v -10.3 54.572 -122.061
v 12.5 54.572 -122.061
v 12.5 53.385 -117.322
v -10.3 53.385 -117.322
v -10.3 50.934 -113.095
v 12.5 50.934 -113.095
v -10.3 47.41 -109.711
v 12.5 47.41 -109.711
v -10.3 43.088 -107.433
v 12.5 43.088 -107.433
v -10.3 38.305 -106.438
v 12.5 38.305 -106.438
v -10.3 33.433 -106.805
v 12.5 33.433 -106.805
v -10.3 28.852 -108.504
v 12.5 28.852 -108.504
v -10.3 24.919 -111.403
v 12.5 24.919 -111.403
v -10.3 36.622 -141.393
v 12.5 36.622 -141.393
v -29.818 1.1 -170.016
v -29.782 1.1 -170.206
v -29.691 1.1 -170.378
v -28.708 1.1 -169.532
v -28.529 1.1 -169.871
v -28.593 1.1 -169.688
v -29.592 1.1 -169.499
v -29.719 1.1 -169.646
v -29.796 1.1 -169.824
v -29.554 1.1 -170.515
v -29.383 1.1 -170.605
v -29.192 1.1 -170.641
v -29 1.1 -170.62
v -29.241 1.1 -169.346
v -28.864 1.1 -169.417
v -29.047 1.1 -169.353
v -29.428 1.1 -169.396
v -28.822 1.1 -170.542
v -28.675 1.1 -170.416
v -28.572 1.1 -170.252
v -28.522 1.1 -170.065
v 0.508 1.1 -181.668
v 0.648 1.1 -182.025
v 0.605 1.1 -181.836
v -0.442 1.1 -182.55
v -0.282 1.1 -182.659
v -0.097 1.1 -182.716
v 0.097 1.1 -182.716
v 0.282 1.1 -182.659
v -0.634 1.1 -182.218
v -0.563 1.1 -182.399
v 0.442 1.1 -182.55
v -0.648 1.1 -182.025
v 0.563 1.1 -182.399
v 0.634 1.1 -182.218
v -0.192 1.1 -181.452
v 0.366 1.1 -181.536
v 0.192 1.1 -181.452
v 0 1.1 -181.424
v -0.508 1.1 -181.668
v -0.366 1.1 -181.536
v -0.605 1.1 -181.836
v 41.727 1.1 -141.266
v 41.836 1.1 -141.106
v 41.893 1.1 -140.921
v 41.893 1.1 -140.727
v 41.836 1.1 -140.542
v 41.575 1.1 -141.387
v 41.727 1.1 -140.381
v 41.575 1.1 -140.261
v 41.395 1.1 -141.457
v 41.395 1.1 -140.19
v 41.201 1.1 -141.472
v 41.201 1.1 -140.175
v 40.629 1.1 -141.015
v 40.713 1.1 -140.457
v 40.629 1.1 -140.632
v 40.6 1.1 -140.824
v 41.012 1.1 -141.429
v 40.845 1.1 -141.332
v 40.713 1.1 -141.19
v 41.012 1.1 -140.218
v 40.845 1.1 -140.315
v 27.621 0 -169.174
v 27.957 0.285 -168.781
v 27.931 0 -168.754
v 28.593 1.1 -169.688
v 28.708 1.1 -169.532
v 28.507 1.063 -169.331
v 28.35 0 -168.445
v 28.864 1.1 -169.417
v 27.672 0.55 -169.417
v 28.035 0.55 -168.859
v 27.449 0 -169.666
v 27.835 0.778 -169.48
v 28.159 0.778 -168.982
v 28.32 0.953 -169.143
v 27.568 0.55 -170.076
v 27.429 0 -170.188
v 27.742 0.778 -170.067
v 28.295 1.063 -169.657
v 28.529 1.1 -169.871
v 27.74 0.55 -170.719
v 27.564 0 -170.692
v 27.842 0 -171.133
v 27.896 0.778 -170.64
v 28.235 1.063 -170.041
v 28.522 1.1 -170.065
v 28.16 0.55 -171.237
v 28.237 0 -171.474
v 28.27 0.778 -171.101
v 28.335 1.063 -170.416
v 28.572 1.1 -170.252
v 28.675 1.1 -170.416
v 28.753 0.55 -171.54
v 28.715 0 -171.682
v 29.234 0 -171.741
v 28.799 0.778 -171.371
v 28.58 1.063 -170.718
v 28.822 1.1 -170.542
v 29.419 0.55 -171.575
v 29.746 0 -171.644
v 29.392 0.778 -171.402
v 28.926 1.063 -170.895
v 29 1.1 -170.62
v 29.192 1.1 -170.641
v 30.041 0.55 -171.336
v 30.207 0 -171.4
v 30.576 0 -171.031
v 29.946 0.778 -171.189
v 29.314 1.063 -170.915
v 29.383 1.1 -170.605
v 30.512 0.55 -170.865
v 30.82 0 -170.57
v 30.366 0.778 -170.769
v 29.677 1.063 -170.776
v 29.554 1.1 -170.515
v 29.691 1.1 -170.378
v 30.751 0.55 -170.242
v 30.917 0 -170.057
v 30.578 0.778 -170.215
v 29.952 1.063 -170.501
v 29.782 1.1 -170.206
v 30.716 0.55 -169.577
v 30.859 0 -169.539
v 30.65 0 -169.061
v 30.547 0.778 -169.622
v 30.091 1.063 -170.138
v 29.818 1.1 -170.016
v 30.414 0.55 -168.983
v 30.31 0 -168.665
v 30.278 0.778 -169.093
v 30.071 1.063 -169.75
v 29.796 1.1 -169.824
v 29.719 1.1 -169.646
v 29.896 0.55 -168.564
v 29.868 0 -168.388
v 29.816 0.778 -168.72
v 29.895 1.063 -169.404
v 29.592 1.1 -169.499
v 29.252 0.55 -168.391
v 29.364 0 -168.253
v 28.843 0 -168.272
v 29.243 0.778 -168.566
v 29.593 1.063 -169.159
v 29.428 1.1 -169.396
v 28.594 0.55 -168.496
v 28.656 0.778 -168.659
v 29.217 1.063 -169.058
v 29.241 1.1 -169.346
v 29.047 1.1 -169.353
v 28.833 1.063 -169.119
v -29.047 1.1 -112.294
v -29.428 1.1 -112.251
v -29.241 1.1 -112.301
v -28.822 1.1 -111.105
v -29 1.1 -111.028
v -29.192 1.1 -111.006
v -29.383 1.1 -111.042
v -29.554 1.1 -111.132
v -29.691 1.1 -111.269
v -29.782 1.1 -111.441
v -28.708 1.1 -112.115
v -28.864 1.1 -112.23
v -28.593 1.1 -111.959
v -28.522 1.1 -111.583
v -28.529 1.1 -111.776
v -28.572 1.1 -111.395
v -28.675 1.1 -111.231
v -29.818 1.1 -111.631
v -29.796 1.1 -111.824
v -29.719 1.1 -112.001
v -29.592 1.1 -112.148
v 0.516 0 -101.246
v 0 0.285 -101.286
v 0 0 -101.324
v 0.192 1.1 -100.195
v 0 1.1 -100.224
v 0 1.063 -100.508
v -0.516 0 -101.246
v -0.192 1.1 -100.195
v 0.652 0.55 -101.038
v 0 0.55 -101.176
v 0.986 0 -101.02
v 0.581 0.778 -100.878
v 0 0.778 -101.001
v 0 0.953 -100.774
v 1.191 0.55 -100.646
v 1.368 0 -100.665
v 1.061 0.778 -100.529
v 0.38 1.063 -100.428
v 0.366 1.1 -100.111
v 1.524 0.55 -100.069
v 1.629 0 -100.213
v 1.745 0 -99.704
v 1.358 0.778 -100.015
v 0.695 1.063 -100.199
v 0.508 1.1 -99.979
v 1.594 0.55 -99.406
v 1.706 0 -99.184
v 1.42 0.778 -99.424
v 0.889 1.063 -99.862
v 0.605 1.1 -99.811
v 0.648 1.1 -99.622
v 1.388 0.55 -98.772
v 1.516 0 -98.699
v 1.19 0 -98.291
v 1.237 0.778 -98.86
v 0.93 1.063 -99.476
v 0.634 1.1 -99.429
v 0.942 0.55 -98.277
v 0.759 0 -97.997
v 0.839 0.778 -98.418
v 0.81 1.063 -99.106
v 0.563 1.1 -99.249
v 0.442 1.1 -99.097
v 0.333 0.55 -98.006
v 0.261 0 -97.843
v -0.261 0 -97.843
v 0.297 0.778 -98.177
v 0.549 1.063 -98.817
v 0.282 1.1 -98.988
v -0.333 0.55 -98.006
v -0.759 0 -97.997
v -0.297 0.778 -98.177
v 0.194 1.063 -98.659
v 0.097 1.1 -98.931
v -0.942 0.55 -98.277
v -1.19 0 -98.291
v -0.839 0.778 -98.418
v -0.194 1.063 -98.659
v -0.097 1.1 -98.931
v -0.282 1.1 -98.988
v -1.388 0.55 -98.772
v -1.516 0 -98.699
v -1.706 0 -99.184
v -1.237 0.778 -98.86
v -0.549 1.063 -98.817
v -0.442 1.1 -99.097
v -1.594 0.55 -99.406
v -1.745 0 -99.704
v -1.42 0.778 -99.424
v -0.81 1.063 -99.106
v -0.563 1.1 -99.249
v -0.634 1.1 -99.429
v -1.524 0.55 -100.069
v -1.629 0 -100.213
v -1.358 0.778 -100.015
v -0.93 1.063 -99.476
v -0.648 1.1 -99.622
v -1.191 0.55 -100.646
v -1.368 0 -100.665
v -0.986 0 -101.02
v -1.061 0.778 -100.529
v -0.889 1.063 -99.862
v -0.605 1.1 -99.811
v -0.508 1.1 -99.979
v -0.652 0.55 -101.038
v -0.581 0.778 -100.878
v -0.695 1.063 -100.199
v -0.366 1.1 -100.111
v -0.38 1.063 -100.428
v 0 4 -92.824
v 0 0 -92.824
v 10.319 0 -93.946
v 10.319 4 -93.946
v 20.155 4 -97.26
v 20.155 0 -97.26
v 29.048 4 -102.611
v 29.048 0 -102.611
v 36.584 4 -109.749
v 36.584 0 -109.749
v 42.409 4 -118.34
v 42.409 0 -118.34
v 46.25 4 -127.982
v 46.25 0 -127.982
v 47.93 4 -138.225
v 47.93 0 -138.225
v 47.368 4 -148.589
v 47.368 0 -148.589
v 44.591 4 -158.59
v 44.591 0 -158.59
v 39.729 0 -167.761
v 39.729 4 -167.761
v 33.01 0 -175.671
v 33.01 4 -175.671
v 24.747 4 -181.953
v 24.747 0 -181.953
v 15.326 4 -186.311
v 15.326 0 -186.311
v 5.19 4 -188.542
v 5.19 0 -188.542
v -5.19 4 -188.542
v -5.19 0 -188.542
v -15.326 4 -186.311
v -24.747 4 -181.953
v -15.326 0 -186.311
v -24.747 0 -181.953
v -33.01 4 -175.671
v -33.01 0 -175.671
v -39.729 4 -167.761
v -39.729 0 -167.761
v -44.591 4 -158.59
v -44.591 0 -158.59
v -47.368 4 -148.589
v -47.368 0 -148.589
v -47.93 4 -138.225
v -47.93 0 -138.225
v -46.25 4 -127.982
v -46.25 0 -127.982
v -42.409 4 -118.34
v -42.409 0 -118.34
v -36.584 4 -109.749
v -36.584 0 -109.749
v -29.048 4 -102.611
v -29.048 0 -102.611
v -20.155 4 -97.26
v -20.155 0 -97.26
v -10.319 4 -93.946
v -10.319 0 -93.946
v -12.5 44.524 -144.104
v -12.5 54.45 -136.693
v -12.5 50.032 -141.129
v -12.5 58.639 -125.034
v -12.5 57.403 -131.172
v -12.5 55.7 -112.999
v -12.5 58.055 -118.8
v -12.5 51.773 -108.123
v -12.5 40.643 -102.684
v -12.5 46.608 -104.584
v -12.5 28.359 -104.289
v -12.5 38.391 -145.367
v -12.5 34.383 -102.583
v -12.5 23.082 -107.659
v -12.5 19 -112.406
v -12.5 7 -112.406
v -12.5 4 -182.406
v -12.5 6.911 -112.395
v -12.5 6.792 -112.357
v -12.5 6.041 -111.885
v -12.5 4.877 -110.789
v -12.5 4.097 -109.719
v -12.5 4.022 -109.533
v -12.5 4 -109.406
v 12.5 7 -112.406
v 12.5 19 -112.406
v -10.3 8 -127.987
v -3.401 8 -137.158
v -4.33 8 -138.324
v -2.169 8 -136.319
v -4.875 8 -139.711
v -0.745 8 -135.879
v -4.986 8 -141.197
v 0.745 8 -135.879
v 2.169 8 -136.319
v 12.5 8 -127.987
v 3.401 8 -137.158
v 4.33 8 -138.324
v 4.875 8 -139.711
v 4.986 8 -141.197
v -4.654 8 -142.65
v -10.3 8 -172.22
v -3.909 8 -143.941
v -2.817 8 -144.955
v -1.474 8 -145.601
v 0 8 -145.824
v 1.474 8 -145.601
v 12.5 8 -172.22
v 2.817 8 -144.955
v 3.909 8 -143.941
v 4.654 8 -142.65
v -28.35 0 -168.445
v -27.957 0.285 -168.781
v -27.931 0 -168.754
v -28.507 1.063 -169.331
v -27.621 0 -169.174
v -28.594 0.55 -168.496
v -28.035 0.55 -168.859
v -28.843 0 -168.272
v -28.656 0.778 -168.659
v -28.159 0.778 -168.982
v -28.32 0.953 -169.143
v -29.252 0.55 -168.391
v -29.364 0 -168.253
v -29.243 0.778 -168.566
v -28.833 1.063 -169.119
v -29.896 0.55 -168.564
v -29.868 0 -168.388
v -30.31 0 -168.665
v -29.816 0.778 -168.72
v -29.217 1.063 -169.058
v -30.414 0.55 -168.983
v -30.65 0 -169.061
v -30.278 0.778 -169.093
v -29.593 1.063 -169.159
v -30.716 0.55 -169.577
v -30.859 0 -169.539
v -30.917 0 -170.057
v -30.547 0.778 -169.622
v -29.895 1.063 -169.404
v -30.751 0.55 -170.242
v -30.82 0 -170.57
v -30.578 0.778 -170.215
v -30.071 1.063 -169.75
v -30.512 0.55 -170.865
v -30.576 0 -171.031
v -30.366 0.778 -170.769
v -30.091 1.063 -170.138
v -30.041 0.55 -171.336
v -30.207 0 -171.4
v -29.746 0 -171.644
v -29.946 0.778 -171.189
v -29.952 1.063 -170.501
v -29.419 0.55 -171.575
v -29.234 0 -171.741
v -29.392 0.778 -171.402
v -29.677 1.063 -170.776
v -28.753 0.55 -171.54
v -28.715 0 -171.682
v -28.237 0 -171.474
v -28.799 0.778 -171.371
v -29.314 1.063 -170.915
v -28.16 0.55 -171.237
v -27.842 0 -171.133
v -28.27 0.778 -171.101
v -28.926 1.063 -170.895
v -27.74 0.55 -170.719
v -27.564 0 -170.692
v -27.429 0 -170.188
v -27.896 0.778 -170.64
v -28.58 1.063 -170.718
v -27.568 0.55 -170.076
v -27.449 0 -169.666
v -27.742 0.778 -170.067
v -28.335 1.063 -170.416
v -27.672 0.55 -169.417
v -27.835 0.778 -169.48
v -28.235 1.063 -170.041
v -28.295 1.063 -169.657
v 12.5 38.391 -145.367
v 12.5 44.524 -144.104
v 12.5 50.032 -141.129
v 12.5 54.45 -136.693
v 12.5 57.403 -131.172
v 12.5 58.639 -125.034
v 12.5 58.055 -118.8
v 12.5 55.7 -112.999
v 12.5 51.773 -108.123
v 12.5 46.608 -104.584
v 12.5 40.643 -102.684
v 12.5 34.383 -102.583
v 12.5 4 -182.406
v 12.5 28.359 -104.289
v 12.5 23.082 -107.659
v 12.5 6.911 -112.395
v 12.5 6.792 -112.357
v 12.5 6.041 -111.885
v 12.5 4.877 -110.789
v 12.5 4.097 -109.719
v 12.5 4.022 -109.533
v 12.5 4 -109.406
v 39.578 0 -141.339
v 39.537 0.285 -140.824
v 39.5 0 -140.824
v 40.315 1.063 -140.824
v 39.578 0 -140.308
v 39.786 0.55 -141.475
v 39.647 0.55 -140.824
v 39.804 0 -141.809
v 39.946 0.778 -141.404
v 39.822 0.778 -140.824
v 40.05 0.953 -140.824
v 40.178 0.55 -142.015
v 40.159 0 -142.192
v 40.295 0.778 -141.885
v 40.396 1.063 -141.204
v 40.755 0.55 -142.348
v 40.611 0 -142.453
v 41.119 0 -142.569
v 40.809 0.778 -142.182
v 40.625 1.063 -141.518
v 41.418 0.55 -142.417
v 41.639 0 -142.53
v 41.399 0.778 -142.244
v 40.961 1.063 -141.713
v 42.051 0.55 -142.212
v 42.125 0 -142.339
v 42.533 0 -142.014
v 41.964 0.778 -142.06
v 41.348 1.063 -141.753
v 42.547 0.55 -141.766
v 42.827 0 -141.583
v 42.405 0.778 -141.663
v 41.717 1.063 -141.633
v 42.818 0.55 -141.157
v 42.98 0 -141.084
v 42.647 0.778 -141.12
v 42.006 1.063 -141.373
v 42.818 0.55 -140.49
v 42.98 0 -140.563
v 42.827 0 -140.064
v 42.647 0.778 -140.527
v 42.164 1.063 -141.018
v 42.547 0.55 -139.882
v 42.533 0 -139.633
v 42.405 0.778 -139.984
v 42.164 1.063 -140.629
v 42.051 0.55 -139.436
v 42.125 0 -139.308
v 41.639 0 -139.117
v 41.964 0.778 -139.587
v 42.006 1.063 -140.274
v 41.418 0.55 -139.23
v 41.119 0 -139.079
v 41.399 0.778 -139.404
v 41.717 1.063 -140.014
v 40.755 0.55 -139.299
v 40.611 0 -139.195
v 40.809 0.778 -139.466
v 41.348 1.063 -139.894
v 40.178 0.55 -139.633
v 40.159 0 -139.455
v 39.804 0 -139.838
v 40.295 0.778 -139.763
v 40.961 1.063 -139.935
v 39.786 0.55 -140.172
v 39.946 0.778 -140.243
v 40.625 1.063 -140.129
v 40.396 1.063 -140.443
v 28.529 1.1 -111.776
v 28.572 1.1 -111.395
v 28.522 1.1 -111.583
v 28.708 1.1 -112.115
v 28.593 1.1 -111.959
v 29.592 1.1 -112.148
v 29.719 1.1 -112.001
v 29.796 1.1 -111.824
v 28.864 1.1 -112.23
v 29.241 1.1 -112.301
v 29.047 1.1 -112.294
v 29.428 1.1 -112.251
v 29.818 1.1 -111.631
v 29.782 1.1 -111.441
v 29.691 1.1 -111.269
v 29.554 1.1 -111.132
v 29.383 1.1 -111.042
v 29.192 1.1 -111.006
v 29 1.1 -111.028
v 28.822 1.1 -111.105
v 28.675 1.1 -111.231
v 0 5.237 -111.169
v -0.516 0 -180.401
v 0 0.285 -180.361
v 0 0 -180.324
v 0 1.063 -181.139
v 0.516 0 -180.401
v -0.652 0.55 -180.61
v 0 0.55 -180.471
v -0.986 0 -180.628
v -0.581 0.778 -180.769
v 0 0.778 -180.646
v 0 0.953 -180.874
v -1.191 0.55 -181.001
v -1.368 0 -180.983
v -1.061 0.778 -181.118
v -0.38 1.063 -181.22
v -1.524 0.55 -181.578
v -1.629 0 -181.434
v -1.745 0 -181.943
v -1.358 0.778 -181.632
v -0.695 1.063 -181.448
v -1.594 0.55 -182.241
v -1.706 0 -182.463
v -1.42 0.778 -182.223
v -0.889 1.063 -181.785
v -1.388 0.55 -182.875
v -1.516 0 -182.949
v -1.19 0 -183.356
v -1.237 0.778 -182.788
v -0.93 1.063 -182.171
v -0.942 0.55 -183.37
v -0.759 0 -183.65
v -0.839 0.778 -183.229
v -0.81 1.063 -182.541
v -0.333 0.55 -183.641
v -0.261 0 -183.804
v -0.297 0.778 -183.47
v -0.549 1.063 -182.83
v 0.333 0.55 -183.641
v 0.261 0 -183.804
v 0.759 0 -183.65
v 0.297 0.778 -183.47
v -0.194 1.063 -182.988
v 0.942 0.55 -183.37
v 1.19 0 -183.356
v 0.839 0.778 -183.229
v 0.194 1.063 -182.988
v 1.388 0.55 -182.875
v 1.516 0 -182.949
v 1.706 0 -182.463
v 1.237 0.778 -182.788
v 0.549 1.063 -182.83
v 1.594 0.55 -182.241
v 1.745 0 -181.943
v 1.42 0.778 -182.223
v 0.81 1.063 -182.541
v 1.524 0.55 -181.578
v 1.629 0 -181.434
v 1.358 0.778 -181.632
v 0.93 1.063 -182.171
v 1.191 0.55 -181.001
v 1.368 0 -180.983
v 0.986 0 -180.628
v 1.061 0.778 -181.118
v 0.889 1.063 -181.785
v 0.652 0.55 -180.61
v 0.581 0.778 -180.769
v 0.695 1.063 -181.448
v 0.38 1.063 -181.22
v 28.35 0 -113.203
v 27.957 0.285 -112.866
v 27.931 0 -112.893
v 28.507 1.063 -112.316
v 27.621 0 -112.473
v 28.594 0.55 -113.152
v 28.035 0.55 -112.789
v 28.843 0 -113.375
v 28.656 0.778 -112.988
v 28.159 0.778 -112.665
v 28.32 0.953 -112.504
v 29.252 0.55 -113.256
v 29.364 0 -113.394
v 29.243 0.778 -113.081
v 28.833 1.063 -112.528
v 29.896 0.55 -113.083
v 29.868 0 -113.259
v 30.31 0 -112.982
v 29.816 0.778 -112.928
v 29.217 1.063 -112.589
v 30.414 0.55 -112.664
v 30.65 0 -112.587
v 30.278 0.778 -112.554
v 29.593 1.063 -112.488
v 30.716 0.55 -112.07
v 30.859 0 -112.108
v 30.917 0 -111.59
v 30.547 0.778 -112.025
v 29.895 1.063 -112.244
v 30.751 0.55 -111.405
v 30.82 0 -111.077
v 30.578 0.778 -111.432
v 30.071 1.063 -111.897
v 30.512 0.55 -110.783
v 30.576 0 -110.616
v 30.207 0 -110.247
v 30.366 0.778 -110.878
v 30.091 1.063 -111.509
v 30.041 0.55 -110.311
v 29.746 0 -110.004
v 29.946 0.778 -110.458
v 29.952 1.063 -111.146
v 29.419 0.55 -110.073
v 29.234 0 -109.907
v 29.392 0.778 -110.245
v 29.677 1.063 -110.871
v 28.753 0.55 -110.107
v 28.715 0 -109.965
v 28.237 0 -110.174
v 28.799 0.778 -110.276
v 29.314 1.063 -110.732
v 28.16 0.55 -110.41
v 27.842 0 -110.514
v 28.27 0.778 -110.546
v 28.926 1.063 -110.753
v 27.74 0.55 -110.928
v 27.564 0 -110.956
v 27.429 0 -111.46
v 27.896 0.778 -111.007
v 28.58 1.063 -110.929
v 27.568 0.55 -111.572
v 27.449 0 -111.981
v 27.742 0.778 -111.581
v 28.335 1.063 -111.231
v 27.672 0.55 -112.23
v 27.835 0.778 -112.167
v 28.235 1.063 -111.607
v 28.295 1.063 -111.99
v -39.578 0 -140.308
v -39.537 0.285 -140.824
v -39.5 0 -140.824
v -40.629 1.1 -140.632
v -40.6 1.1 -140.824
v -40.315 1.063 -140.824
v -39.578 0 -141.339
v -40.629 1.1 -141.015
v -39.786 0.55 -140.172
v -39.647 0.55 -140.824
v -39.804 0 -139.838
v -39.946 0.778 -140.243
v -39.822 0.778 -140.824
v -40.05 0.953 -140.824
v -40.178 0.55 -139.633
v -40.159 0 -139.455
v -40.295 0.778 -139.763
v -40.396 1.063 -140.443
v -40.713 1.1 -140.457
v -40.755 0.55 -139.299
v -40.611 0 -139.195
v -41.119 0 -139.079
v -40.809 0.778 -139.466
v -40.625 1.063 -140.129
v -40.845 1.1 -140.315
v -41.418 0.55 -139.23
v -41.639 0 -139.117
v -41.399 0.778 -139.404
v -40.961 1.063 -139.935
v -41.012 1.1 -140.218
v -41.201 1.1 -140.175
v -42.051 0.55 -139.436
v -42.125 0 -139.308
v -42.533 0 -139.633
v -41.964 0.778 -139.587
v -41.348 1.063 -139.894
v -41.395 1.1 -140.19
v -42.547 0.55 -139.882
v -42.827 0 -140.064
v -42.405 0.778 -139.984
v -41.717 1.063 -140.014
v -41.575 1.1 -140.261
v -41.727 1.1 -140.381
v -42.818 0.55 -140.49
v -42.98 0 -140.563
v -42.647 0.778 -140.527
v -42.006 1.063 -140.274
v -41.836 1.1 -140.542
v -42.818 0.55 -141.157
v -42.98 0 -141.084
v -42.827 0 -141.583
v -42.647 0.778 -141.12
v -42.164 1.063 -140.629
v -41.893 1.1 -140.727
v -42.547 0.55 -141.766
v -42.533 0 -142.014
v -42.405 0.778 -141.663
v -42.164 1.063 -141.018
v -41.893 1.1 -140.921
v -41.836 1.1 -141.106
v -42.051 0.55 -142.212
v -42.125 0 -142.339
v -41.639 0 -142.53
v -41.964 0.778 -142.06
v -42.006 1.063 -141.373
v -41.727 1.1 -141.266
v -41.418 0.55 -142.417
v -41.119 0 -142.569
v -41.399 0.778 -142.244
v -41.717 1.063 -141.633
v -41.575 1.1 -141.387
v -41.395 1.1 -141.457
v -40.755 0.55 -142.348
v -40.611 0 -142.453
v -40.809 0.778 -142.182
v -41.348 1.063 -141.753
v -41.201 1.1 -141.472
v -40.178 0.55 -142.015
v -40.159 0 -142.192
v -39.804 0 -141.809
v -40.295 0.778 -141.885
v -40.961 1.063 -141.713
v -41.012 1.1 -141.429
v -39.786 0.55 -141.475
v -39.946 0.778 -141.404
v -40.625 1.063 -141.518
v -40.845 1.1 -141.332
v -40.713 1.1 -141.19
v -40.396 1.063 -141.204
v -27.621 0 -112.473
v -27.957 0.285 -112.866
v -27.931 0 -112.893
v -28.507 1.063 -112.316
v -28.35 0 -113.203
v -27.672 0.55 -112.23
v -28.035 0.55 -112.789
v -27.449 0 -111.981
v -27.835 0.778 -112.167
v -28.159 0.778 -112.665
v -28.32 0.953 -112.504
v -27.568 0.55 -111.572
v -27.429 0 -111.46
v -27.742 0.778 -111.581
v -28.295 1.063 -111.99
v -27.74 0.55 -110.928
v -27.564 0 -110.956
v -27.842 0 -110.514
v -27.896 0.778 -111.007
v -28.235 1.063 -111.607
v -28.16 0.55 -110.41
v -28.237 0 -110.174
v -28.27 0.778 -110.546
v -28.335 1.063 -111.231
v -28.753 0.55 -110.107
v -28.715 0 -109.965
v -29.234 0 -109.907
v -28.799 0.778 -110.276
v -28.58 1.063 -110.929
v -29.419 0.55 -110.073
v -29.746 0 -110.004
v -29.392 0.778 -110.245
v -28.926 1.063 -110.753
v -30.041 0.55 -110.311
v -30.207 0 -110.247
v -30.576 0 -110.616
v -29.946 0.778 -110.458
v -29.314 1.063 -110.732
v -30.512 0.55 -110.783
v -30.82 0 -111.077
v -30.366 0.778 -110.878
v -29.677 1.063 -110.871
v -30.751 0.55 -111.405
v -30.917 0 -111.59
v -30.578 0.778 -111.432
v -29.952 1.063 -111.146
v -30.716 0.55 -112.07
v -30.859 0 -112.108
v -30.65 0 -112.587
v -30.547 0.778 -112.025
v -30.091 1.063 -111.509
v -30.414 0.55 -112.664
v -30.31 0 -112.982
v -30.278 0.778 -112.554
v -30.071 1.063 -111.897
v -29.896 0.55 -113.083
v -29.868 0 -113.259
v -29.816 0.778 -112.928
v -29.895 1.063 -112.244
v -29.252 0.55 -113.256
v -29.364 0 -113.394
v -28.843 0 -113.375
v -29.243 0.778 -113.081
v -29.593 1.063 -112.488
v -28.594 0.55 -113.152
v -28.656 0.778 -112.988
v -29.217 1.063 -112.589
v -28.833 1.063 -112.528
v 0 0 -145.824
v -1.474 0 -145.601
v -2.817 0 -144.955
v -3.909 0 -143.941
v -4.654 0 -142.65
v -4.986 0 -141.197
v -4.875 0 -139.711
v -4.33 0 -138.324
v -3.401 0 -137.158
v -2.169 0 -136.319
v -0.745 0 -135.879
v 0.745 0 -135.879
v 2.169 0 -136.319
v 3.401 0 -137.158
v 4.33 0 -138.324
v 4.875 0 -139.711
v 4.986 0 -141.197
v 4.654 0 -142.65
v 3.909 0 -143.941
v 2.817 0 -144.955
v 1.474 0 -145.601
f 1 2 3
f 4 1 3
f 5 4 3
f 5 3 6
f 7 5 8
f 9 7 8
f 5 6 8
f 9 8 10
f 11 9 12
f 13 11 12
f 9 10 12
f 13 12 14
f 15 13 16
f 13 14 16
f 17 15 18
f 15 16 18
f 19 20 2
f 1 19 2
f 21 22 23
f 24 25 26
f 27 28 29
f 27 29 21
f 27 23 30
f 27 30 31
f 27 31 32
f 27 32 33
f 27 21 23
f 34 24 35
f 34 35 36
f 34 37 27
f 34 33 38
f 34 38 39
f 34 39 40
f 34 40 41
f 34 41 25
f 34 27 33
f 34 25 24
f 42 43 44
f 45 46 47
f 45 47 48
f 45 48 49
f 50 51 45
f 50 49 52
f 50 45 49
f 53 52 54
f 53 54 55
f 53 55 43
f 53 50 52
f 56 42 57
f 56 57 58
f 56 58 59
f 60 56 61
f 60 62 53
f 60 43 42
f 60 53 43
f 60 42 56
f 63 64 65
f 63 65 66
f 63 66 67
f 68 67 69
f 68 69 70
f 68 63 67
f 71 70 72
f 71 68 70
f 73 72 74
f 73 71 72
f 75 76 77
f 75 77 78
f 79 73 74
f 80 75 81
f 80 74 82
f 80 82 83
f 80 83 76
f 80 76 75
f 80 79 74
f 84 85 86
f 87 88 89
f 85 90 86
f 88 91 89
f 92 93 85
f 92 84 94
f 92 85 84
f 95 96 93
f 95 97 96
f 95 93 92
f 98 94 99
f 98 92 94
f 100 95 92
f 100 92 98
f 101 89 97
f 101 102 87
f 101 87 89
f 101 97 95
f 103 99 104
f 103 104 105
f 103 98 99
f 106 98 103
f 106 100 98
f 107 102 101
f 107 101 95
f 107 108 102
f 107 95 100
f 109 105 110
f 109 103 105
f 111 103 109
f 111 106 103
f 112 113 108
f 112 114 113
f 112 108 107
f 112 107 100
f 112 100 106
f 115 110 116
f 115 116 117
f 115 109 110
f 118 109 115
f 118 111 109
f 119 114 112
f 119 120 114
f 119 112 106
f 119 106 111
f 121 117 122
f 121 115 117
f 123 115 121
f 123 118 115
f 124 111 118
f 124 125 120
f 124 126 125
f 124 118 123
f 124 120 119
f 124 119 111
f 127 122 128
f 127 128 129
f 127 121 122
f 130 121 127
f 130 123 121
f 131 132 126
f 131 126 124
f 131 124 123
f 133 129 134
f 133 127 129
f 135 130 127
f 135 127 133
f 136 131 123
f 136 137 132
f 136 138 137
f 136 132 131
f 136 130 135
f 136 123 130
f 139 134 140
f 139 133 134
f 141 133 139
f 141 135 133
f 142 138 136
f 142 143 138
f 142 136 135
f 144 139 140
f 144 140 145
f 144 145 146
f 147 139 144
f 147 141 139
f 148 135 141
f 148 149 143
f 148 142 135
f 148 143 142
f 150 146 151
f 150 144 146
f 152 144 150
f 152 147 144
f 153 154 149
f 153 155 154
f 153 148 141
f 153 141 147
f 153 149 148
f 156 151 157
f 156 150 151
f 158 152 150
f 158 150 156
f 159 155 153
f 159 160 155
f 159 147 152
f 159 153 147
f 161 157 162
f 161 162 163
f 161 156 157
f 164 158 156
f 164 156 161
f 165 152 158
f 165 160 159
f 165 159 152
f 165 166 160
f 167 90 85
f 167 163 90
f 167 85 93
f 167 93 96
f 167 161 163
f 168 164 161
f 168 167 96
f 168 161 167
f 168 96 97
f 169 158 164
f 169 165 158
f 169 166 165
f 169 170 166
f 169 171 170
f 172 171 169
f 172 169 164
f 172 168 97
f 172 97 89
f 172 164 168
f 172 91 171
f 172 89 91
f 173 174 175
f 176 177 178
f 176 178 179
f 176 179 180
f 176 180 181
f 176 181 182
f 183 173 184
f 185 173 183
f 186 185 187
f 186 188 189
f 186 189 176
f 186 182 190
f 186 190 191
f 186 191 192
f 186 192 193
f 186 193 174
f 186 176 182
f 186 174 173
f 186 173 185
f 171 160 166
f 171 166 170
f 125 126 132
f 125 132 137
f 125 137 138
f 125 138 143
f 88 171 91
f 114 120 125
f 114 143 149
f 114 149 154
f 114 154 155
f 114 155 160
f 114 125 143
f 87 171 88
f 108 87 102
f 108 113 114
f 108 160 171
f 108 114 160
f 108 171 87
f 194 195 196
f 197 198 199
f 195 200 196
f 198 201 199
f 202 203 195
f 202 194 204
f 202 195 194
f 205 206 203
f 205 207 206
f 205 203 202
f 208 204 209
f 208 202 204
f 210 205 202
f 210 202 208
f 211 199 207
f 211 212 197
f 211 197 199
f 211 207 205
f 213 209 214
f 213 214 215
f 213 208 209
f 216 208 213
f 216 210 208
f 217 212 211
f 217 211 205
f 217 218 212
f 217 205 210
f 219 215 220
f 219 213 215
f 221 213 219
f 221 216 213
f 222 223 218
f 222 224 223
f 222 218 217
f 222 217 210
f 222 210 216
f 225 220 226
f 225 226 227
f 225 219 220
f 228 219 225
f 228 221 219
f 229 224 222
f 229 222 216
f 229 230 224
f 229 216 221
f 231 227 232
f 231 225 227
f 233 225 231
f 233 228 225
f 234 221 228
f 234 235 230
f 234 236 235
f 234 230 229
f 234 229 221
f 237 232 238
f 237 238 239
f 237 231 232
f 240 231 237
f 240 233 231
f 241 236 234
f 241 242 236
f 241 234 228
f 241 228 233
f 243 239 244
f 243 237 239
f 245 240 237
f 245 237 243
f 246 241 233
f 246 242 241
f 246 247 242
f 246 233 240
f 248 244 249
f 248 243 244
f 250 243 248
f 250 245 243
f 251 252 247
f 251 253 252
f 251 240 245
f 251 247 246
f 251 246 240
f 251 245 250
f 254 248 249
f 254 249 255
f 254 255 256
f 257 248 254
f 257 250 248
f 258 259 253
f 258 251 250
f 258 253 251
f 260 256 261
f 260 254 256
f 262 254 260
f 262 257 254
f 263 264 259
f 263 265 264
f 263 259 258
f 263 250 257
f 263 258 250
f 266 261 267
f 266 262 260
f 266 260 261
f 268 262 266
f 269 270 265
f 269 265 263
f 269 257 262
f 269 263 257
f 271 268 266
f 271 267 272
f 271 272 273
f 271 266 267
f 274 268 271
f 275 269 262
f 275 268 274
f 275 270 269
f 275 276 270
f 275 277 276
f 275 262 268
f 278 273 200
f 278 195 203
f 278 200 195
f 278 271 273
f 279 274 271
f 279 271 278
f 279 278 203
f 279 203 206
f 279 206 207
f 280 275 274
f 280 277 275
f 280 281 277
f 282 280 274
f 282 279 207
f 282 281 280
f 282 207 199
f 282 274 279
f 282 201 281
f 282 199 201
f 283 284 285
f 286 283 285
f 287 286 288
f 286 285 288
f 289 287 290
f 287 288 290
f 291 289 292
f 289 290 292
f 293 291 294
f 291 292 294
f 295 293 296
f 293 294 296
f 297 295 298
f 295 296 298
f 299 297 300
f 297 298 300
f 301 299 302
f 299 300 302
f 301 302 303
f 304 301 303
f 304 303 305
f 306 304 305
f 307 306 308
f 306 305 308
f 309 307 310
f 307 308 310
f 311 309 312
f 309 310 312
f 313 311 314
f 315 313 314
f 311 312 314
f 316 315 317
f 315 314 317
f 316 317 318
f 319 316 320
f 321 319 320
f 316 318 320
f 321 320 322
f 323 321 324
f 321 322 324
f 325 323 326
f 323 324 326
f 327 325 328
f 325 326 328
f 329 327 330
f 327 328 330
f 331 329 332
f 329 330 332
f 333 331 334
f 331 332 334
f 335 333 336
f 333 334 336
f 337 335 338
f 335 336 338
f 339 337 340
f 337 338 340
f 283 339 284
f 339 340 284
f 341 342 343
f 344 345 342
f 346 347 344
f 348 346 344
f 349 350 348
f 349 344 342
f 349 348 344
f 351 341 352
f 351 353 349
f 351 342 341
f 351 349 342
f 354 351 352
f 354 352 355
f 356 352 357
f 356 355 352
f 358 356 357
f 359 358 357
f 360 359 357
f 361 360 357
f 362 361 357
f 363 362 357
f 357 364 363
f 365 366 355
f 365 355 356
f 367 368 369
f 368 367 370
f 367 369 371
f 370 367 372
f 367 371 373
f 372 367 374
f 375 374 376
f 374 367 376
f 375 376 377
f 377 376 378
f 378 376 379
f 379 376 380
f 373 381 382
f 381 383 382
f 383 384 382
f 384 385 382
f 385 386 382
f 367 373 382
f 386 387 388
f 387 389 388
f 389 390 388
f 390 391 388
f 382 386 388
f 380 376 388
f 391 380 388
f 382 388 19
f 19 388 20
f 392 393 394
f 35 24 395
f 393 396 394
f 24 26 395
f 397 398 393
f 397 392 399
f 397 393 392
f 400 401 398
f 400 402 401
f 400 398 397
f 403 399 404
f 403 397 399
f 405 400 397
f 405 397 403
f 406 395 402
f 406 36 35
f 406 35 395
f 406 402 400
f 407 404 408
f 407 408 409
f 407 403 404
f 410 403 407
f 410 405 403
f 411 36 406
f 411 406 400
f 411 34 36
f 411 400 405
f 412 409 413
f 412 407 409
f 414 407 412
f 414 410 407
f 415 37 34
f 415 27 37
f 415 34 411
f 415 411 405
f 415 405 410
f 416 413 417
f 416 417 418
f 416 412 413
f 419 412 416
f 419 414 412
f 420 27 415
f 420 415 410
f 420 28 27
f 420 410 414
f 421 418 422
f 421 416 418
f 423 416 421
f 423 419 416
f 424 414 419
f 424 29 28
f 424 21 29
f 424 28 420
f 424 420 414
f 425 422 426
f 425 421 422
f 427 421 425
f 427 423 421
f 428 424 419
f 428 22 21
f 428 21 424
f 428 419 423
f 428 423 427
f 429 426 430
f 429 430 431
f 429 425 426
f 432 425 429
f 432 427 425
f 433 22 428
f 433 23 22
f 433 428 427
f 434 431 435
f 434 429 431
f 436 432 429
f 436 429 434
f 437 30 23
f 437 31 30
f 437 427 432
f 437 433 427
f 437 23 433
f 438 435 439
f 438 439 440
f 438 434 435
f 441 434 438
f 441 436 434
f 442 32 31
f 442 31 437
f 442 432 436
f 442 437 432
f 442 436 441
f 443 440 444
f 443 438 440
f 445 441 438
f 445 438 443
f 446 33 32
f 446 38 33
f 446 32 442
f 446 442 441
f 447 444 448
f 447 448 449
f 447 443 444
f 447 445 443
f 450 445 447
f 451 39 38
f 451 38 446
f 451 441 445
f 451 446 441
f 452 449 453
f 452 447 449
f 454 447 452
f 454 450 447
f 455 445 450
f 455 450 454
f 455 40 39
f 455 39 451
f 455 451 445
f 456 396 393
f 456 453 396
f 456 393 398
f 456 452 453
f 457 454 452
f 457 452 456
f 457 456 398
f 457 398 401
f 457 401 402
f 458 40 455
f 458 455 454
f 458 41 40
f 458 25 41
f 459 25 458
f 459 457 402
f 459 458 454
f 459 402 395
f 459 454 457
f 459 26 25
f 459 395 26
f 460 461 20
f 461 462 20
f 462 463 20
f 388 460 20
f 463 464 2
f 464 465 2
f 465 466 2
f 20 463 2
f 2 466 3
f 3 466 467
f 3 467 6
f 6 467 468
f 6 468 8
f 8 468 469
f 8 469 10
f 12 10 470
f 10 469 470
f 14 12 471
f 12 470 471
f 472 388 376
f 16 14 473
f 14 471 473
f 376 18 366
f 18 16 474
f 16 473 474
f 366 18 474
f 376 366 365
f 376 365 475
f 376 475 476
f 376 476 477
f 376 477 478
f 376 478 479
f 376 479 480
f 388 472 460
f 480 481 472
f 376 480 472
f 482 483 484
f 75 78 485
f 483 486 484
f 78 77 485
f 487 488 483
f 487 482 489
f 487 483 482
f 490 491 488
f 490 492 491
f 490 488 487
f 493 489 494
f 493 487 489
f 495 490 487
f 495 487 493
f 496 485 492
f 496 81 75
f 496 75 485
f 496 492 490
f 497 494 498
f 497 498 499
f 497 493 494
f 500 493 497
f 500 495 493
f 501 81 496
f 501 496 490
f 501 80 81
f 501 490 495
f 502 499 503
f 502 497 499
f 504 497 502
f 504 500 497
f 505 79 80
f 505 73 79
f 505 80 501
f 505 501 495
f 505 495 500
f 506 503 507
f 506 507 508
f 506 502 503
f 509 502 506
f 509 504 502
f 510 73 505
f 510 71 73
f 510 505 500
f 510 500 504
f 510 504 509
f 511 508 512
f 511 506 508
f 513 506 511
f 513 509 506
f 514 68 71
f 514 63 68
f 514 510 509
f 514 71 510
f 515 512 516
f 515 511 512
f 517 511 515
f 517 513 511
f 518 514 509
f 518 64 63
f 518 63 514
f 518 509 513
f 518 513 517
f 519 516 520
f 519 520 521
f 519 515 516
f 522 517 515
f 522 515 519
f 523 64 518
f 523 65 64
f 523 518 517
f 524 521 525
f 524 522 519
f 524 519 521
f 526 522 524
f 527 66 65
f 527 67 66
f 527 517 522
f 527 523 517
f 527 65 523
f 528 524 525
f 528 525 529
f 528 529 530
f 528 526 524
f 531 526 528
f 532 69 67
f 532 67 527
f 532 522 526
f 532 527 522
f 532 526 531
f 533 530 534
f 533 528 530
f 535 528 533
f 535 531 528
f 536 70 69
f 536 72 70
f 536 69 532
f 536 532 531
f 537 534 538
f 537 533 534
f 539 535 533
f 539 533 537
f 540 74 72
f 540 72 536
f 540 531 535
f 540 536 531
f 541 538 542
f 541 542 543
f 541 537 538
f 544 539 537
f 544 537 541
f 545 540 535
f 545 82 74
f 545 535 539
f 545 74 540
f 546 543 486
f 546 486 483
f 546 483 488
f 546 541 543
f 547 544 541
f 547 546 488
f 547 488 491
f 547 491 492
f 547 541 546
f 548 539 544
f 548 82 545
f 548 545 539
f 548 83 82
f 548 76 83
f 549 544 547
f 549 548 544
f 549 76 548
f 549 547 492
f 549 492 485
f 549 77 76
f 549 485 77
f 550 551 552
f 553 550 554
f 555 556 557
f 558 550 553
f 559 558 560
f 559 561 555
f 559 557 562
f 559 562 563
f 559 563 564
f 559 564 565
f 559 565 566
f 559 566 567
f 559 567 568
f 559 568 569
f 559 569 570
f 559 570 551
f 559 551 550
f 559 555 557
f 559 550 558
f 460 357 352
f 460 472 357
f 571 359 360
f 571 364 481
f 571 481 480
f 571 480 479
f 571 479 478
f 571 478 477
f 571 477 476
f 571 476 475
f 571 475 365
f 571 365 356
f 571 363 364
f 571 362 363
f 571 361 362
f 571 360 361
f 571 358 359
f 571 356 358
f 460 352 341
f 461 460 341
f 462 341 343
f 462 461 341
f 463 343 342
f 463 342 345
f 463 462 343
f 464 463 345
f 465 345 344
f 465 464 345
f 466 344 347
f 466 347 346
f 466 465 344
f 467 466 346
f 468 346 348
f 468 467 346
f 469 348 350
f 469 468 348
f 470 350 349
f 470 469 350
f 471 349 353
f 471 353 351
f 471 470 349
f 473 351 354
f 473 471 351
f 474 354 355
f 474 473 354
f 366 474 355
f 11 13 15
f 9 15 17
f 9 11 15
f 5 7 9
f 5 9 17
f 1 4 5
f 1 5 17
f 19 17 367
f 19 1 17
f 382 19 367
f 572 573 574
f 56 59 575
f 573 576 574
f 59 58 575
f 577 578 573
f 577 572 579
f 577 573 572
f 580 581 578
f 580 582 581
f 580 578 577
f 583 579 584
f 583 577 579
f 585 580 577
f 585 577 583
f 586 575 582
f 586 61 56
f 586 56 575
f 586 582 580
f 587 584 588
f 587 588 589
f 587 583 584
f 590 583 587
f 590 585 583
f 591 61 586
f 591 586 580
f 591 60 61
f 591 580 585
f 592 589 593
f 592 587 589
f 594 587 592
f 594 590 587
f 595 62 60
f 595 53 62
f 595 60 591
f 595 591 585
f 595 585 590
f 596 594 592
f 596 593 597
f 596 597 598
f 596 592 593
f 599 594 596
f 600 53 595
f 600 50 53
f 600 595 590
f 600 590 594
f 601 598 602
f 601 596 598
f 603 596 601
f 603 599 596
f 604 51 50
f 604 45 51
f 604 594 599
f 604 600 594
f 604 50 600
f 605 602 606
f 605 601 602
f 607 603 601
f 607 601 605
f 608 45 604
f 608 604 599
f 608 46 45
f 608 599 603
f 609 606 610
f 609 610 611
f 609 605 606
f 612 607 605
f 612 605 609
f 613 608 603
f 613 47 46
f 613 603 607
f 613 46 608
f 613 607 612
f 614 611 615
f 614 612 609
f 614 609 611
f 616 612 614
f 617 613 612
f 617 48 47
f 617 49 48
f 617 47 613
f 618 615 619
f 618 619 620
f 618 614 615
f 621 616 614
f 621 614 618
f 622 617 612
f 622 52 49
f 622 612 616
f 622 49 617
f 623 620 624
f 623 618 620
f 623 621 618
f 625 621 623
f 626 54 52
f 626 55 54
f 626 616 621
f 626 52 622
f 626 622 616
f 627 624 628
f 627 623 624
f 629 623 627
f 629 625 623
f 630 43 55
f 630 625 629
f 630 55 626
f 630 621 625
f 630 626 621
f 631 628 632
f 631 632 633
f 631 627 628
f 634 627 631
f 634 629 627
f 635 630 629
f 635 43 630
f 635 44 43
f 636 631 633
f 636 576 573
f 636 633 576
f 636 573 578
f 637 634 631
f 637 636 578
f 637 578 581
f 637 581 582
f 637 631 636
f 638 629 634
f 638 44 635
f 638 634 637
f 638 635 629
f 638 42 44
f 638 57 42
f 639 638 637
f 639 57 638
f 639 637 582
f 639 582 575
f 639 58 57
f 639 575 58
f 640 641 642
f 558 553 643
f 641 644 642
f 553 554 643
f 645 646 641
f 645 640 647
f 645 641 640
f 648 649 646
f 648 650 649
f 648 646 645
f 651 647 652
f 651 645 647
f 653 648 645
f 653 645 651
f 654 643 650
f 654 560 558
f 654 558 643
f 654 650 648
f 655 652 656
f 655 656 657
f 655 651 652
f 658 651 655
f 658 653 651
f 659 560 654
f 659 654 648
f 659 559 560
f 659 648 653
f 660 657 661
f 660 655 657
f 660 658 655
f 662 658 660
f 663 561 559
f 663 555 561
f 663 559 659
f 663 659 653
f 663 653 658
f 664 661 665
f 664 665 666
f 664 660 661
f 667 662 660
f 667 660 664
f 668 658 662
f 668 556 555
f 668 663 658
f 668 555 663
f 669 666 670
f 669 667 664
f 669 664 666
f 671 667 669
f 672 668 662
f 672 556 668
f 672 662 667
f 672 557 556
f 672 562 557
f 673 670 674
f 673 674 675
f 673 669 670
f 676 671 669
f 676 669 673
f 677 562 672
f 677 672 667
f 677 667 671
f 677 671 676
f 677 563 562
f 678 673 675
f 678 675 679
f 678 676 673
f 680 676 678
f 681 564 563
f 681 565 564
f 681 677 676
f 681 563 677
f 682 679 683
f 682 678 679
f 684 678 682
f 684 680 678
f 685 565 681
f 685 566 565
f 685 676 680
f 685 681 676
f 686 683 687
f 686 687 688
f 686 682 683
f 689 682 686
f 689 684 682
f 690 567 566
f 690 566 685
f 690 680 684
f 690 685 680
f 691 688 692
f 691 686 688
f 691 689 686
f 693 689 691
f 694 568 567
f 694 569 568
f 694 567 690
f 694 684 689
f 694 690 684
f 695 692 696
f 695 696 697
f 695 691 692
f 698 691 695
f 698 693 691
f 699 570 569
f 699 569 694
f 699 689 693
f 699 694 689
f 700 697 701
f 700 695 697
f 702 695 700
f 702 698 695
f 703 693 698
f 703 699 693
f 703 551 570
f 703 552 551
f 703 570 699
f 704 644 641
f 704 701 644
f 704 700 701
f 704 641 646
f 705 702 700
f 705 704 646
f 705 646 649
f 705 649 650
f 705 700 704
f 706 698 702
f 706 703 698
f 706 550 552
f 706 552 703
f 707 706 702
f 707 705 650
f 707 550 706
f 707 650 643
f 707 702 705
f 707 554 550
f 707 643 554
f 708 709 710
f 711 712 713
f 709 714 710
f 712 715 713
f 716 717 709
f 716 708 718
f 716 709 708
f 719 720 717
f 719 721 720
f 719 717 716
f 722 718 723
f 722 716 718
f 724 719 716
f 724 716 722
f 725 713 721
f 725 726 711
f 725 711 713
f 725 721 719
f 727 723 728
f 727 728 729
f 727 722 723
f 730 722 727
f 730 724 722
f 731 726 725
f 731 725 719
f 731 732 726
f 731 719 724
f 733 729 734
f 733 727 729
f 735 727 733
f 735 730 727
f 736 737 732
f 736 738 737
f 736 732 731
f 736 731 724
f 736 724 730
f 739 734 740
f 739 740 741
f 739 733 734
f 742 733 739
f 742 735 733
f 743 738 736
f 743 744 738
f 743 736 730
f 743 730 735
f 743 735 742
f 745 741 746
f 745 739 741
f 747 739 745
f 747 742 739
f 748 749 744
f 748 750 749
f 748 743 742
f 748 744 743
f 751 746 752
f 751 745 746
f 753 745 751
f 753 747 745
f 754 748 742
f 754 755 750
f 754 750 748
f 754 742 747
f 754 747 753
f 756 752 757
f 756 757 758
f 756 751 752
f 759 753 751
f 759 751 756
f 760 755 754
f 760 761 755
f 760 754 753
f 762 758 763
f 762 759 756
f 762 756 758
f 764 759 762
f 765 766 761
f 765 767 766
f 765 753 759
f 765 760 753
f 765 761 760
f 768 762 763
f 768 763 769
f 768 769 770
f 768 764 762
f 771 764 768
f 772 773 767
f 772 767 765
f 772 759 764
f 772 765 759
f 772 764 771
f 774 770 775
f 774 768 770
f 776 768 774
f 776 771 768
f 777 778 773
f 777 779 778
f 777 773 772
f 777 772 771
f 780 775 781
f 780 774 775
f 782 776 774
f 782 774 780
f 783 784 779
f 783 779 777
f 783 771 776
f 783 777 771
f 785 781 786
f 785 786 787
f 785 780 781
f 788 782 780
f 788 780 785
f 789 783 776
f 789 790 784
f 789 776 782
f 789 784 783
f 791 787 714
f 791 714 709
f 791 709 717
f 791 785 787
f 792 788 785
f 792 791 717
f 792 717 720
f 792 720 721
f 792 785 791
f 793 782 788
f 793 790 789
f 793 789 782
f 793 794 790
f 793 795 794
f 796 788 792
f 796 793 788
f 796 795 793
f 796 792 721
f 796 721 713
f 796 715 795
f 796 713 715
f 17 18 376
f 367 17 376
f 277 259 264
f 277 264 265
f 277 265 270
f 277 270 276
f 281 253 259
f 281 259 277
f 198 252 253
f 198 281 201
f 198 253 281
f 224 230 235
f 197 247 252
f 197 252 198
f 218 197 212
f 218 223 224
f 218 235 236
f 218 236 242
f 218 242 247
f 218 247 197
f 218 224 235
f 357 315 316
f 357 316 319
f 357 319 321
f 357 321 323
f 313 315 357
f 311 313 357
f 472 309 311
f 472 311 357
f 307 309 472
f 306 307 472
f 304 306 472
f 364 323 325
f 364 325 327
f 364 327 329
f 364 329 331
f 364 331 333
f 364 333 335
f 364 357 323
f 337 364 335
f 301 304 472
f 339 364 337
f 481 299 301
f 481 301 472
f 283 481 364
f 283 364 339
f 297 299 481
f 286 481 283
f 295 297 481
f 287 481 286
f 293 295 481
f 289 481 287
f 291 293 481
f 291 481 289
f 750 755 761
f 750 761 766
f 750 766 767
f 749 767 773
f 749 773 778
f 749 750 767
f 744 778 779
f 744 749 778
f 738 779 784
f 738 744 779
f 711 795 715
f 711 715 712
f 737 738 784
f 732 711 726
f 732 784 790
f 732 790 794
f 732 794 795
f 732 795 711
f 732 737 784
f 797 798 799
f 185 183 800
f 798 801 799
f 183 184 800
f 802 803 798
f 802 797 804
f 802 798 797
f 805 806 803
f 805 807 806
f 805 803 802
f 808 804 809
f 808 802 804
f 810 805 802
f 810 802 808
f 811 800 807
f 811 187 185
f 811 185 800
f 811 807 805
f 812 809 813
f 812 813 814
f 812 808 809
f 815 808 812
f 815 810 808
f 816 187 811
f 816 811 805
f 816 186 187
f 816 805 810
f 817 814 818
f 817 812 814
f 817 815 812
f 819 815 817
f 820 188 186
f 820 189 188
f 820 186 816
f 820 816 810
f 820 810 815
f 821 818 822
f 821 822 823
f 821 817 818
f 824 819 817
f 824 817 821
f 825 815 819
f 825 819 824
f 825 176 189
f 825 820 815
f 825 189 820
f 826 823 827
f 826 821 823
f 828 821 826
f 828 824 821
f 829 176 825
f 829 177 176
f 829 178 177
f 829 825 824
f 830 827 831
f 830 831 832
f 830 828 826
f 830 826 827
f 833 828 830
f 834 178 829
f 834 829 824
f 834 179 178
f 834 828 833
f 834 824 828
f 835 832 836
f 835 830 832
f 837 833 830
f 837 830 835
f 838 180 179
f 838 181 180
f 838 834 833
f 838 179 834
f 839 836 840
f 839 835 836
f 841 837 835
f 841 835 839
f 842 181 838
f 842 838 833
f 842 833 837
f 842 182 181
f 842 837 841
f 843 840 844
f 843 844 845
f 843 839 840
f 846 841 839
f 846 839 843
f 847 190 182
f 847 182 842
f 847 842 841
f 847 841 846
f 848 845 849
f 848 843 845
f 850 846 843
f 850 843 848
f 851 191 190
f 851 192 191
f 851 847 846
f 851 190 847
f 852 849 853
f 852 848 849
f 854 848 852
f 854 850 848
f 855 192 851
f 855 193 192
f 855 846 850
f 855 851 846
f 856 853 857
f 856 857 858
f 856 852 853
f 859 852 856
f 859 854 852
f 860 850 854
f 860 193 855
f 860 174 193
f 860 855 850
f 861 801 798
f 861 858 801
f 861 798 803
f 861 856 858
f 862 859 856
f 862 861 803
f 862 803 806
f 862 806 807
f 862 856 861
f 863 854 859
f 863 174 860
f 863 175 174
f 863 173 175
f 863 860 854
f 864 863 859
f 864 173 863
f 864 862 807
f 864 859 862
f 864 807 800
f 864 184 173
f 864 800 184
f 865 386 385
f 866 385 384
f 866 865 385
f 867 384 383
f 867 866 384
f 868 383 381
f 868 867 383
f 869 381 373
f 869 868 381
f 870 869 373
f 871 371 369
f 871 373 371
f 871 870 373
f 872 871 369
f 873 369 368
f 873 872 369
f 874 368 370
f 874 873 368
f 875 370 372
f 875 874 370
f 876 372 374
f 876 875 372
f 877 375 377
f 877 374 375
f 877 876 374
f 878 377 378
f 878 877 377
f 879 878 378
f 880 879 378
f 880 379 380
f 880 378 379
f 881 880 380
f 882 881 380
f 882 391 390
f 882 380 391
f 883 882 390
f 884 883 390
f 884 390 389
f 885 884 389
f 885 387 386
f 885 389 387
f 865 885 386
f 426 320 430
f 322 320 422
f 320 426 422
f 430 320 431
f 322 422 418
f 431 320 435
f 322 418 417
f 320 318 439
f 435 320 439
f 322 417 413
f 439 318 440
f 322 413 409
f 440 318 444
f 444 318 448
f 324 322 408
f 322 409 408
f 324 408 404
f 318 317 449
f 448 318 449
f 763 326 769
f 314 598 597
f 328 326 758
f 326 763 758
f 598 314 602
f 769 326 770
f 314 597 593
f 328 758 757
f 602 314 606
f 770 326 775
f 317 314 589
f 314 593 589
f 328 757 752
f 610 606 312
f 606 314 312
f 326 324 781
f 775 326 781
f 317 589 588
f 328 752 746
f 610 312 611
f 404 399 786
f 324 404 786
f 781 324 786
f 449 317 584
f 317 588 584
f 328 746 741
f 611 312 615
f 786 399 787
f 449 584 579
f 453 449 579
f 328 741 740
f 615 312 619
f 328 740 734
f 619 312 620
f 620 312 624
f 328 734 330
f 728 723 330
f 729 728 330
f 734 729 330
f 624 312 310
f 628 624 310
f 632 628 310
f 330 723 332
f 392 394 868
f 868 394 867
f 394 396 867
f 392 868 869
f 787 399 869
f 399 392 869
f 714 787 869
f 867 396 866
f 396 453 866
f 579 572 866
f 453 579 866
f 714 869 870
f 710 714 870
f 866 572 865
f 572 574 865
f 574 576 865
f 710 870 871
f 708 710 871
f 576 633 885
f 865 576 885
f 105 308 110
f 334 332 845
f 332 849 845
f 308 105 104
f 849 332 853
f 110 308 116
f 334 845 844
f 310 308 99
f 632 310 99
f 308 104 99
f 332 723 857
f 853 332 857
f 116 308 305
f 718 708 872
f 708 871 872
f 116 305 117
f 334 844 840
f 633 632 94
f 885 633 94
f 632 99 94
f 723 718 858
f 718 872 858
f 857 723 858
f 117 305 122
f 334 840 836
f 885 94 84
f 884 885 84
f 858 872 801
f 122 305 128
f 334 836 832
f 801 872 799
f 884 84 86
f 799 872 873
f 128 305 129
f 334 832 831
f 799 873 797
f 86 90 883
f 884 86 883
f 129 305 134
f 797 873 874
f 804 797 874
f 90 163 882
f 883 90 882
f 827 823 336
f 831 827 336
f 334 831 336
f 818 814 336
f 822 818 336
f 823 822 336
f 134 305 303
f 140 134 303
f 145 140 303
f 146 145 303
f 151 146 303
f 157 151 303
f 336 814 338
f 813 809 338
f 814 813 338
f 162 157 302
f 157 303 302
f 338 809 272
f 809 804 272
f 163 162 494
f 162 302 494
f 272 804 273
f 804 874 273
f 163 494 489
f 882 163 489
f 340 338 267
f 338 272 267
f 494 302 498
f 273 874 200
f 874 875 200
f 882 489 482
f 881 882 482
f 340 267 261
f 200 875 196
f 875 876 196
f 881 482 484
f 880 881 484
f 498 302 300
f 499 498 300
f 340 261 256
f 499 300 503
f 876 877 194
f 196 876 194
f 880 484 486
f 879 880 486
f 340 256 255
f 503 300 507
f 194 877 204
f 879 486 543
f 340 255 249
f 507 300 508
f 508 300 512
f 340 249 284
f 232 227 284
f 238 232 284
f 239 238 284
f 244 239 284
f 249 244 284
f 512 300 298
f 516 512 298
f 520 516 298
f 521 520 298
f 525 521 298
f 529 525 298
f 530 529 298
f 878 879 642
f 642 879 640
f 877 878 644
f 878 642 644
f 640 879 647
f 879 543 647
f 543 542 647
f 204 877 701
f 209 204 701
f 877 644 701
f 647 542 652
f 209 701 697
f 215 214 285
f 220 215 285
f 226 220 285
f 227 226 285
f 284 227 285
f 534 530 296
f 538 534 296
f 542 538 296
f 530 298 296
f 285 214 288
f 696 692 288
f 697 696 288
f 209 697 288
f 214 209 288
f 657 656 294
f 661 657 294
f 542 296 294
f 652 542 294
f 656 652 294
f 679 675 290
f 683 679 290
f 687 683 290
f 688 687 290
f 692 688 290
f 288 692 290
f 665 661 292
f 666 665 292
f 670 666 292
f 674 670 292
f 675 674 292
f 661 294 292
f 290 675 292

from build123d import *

# Parameters (mm, degrees)
CROQUIS3_R              = 48
SALIENTE_EXTRUIR2_DEPTH = 4
CROQUIS5_R              = 1.75
CORTAR_EXTRUIR3_DEPTH   = 1.1
REDONDEO3_R             = 1.1
MATRIZC5_COUNT          = 8
REDONDEO3_OF_MATRIZC5_R = 1.1
SALIENTE_EXTRUIR3_DEPTH = 12.5
REDONDEO4_START         = -12.5
REDONDEO4_DEPTH         = 25
CORTAR_EXTRUIR4_DEPTH   = 22.8
CROQUIS8_R              = 5
CORTAR_EXTRUIR5_DEPTH   = 14.8


with BuildPart() as part:
    # Croquis3 → Saliente-Extruir2 (new body)
    with BuildSketch(Plane(origin=(0, 0, 0), x_dir=(1, 0, 0), z_dir=(0, 1, 0))):
        with Locations(Location((0, 140.82362169, 0), (0, 0, 270))):
            Circle(CROQUIS3_R)
    extrude(amount=SALIENTE_EXTRUIR2_DEPTH)

    # Croquis5 → Cortar-Extruir3 (cut)
    with BuildSketch(Plane.XZ):
        with Locations(Location((0, -99.57362169, 0), (0, 0, 270))):
            Circle(CROQUIS5_R)
    cortar_extruir3 = extrude(amount=-CORTAR_EXTRUIR3_DEPTH, mode=Mode.SUBTRACT)

    # Redondeo3
    redondeo3_edges = [part.edges().sort_by_distance(p)[0] for p in [
        (0, 1.1, -97.82362169),
    ]]
    fillet(redondeo3_edges, radius=REDONDEO3_R - 0.0001)  # a hair under: the kernel refuses the full size

    # MatrizC5: Cortar-Extruir3 ×8 about axis
    matrizc5_axis = Axis((0, 0, -140.82362169), (0, 1, 0))
    for i in range(1, MATRIZC5_COUNT):
        add(cortar_extruir3.rotate(matrizc5_axis, i * 360 / MATRIZC5_COUNT), mode=Mode.SUBTRACT)

    # Redondeo3 of MatrizC5
    redondeo3_of_matrizc5_edges = [part.edges().sort_by_distance(p)[0] for p in [
        (30.405591591, 1.1, -110.418030099),
        (43, 1.1, -140.82362169),
        (30.405591591, 1.1, -171.229213281),
        (0, 1.1, -183.82362169),
        (-30.405591591, 1.1, -171.229213281),
        (-43, 1.1, -140.82362169),
        (-30.405591591, 1.1, -110.418030099),
    ]]
    fillet(redondeo3_of_matrizc5_edges, radius=REDONDEO3_OF_MATRIZC5_R - 0.0001)  # a hair under: the kernel refuses the full size

    # Croquis6 → Saliente-Extruir3 (add, symmetric)
    with BuildSketch(Plane(origin=(0, 0, 0), x_dir=(0, 0, -1), z_dir=(1, 0, 0))):
        with BuildLine():
            ThreePointArc((145.401441519, 37.169010455), (145.39274788, 37.78036216), (145.366673993, 38.391219459))
            Line((145.366673993, 38.391219459), (112.406353043, 19))
            ThreePointArc((112.406353043, 19), (134.272208071, 18.335603936), (145.401441519, 37.169010455))
        make_face()
        with BuildLine():
            Line((112.406353043, 19), (145.366673993, 38.391219459))
            ThreePointArc((145.366673993, 38.391219459), (112.999341224, 55.699909223), (112.406353043, 19))
        make_face()
        with BuildLine():
            Line((112.406353043, 4), (182.406353043, 4))
            Line((182.406353043, 4), (145.366673993, 38.391219459))
            ThreePointArc((145.366673993, 38.391219459), (145.39274788, 37.78036216), (145.401441519, 37.169010455))
            ThreePointArc((145.401441519, 37.169010455), (134.272208071, 18.335603936), (112.406353043, 19))
            Line((112.406353043, 19), (112.406353043, 4))
        make_face()
    extrude(amount=SALIENTE_EXTRUIR3_DEPTH, both=True)

    # Redondeo4: read off the stored shape, not the designer's step
    # Redondeo4 outline → Redondeo4 (add)
    with BuildSketch(Plane.YZ.offset(REDONDEO4_START)):
        with BuildLine():
            add(Edge.make_bspline(
                [(4, -109.406353043), (4, -112.406353043), (7, -112.406353043)],
                knots=[0, 0, 0, 1, 1, 1], degree=2, weights=[1, 0.212132034, 1]))
            Line((4, -109.406353043), (4, -112.406353043))
            Line((4, -112.406353043), (7, -112.406353043))
        make_face()
    extrude(amount=REDONDEO4_DEPTH)

    # Croquis7 → Cortar-Extruir4 (cut)
    with BuildSketch(Plane(origin=(12.5, 0, 0), x_dir=(0, 0, -1), z_dir=(1, 0, 0))):
        with BuildLine():
            Line((111.403468482, 24.919493324), (141.392905589, 36.622489926))
            Line((141.392905589, 36.622489926), (122.06113227, 54.571977497))
            ThreePointArc((122.06113227, 54.571977497), (107.432864193, 43.088128705), (111.403468482, 24.919493324))
        make_face()
        with BuildLine():
            ThreePointArc((111.403468482, 24.919493324), (130.263341435, 20.866365594), (141.392905589, 36.622489926))
            Line((141.392905589, 36.622489926), (111.403468482, 24.919493324))
        make_face()
        with BuildLine():
            Line((172.219606624, 8), (141.392905589, 36.622489926))
            ThreePointArc((141.392905589, 36.622489926), (130.263341435, 20.866365594), (111.403468482, 24.919493324))
            Line((111.403468482, 24.919493324), (127.986607419, 8))
            Line((127.986607419, 8), (172.219606624, 8))
        make_face()
    extrude(amount=-CORTAR_EXTRUIR4_DEPTH, mode=Mode.SUBTRACT)

    # Croquis8 → Cortar-Extruir5 (cut)
    with BuildSketch(Plane(origin=(0, 0, 0), x_dir=(1, 0, 0), z_dir=(0, 1, 0))):
        with Locations(Location((0, 140.82362169, 0), (0, 0, 90))):
            Circle(CROQUIS8_R)
    extrude(amount=CORTAR_EXTRUIR5_DEPTH, mode=Mode.SUBTRACT)


solid = part.part
